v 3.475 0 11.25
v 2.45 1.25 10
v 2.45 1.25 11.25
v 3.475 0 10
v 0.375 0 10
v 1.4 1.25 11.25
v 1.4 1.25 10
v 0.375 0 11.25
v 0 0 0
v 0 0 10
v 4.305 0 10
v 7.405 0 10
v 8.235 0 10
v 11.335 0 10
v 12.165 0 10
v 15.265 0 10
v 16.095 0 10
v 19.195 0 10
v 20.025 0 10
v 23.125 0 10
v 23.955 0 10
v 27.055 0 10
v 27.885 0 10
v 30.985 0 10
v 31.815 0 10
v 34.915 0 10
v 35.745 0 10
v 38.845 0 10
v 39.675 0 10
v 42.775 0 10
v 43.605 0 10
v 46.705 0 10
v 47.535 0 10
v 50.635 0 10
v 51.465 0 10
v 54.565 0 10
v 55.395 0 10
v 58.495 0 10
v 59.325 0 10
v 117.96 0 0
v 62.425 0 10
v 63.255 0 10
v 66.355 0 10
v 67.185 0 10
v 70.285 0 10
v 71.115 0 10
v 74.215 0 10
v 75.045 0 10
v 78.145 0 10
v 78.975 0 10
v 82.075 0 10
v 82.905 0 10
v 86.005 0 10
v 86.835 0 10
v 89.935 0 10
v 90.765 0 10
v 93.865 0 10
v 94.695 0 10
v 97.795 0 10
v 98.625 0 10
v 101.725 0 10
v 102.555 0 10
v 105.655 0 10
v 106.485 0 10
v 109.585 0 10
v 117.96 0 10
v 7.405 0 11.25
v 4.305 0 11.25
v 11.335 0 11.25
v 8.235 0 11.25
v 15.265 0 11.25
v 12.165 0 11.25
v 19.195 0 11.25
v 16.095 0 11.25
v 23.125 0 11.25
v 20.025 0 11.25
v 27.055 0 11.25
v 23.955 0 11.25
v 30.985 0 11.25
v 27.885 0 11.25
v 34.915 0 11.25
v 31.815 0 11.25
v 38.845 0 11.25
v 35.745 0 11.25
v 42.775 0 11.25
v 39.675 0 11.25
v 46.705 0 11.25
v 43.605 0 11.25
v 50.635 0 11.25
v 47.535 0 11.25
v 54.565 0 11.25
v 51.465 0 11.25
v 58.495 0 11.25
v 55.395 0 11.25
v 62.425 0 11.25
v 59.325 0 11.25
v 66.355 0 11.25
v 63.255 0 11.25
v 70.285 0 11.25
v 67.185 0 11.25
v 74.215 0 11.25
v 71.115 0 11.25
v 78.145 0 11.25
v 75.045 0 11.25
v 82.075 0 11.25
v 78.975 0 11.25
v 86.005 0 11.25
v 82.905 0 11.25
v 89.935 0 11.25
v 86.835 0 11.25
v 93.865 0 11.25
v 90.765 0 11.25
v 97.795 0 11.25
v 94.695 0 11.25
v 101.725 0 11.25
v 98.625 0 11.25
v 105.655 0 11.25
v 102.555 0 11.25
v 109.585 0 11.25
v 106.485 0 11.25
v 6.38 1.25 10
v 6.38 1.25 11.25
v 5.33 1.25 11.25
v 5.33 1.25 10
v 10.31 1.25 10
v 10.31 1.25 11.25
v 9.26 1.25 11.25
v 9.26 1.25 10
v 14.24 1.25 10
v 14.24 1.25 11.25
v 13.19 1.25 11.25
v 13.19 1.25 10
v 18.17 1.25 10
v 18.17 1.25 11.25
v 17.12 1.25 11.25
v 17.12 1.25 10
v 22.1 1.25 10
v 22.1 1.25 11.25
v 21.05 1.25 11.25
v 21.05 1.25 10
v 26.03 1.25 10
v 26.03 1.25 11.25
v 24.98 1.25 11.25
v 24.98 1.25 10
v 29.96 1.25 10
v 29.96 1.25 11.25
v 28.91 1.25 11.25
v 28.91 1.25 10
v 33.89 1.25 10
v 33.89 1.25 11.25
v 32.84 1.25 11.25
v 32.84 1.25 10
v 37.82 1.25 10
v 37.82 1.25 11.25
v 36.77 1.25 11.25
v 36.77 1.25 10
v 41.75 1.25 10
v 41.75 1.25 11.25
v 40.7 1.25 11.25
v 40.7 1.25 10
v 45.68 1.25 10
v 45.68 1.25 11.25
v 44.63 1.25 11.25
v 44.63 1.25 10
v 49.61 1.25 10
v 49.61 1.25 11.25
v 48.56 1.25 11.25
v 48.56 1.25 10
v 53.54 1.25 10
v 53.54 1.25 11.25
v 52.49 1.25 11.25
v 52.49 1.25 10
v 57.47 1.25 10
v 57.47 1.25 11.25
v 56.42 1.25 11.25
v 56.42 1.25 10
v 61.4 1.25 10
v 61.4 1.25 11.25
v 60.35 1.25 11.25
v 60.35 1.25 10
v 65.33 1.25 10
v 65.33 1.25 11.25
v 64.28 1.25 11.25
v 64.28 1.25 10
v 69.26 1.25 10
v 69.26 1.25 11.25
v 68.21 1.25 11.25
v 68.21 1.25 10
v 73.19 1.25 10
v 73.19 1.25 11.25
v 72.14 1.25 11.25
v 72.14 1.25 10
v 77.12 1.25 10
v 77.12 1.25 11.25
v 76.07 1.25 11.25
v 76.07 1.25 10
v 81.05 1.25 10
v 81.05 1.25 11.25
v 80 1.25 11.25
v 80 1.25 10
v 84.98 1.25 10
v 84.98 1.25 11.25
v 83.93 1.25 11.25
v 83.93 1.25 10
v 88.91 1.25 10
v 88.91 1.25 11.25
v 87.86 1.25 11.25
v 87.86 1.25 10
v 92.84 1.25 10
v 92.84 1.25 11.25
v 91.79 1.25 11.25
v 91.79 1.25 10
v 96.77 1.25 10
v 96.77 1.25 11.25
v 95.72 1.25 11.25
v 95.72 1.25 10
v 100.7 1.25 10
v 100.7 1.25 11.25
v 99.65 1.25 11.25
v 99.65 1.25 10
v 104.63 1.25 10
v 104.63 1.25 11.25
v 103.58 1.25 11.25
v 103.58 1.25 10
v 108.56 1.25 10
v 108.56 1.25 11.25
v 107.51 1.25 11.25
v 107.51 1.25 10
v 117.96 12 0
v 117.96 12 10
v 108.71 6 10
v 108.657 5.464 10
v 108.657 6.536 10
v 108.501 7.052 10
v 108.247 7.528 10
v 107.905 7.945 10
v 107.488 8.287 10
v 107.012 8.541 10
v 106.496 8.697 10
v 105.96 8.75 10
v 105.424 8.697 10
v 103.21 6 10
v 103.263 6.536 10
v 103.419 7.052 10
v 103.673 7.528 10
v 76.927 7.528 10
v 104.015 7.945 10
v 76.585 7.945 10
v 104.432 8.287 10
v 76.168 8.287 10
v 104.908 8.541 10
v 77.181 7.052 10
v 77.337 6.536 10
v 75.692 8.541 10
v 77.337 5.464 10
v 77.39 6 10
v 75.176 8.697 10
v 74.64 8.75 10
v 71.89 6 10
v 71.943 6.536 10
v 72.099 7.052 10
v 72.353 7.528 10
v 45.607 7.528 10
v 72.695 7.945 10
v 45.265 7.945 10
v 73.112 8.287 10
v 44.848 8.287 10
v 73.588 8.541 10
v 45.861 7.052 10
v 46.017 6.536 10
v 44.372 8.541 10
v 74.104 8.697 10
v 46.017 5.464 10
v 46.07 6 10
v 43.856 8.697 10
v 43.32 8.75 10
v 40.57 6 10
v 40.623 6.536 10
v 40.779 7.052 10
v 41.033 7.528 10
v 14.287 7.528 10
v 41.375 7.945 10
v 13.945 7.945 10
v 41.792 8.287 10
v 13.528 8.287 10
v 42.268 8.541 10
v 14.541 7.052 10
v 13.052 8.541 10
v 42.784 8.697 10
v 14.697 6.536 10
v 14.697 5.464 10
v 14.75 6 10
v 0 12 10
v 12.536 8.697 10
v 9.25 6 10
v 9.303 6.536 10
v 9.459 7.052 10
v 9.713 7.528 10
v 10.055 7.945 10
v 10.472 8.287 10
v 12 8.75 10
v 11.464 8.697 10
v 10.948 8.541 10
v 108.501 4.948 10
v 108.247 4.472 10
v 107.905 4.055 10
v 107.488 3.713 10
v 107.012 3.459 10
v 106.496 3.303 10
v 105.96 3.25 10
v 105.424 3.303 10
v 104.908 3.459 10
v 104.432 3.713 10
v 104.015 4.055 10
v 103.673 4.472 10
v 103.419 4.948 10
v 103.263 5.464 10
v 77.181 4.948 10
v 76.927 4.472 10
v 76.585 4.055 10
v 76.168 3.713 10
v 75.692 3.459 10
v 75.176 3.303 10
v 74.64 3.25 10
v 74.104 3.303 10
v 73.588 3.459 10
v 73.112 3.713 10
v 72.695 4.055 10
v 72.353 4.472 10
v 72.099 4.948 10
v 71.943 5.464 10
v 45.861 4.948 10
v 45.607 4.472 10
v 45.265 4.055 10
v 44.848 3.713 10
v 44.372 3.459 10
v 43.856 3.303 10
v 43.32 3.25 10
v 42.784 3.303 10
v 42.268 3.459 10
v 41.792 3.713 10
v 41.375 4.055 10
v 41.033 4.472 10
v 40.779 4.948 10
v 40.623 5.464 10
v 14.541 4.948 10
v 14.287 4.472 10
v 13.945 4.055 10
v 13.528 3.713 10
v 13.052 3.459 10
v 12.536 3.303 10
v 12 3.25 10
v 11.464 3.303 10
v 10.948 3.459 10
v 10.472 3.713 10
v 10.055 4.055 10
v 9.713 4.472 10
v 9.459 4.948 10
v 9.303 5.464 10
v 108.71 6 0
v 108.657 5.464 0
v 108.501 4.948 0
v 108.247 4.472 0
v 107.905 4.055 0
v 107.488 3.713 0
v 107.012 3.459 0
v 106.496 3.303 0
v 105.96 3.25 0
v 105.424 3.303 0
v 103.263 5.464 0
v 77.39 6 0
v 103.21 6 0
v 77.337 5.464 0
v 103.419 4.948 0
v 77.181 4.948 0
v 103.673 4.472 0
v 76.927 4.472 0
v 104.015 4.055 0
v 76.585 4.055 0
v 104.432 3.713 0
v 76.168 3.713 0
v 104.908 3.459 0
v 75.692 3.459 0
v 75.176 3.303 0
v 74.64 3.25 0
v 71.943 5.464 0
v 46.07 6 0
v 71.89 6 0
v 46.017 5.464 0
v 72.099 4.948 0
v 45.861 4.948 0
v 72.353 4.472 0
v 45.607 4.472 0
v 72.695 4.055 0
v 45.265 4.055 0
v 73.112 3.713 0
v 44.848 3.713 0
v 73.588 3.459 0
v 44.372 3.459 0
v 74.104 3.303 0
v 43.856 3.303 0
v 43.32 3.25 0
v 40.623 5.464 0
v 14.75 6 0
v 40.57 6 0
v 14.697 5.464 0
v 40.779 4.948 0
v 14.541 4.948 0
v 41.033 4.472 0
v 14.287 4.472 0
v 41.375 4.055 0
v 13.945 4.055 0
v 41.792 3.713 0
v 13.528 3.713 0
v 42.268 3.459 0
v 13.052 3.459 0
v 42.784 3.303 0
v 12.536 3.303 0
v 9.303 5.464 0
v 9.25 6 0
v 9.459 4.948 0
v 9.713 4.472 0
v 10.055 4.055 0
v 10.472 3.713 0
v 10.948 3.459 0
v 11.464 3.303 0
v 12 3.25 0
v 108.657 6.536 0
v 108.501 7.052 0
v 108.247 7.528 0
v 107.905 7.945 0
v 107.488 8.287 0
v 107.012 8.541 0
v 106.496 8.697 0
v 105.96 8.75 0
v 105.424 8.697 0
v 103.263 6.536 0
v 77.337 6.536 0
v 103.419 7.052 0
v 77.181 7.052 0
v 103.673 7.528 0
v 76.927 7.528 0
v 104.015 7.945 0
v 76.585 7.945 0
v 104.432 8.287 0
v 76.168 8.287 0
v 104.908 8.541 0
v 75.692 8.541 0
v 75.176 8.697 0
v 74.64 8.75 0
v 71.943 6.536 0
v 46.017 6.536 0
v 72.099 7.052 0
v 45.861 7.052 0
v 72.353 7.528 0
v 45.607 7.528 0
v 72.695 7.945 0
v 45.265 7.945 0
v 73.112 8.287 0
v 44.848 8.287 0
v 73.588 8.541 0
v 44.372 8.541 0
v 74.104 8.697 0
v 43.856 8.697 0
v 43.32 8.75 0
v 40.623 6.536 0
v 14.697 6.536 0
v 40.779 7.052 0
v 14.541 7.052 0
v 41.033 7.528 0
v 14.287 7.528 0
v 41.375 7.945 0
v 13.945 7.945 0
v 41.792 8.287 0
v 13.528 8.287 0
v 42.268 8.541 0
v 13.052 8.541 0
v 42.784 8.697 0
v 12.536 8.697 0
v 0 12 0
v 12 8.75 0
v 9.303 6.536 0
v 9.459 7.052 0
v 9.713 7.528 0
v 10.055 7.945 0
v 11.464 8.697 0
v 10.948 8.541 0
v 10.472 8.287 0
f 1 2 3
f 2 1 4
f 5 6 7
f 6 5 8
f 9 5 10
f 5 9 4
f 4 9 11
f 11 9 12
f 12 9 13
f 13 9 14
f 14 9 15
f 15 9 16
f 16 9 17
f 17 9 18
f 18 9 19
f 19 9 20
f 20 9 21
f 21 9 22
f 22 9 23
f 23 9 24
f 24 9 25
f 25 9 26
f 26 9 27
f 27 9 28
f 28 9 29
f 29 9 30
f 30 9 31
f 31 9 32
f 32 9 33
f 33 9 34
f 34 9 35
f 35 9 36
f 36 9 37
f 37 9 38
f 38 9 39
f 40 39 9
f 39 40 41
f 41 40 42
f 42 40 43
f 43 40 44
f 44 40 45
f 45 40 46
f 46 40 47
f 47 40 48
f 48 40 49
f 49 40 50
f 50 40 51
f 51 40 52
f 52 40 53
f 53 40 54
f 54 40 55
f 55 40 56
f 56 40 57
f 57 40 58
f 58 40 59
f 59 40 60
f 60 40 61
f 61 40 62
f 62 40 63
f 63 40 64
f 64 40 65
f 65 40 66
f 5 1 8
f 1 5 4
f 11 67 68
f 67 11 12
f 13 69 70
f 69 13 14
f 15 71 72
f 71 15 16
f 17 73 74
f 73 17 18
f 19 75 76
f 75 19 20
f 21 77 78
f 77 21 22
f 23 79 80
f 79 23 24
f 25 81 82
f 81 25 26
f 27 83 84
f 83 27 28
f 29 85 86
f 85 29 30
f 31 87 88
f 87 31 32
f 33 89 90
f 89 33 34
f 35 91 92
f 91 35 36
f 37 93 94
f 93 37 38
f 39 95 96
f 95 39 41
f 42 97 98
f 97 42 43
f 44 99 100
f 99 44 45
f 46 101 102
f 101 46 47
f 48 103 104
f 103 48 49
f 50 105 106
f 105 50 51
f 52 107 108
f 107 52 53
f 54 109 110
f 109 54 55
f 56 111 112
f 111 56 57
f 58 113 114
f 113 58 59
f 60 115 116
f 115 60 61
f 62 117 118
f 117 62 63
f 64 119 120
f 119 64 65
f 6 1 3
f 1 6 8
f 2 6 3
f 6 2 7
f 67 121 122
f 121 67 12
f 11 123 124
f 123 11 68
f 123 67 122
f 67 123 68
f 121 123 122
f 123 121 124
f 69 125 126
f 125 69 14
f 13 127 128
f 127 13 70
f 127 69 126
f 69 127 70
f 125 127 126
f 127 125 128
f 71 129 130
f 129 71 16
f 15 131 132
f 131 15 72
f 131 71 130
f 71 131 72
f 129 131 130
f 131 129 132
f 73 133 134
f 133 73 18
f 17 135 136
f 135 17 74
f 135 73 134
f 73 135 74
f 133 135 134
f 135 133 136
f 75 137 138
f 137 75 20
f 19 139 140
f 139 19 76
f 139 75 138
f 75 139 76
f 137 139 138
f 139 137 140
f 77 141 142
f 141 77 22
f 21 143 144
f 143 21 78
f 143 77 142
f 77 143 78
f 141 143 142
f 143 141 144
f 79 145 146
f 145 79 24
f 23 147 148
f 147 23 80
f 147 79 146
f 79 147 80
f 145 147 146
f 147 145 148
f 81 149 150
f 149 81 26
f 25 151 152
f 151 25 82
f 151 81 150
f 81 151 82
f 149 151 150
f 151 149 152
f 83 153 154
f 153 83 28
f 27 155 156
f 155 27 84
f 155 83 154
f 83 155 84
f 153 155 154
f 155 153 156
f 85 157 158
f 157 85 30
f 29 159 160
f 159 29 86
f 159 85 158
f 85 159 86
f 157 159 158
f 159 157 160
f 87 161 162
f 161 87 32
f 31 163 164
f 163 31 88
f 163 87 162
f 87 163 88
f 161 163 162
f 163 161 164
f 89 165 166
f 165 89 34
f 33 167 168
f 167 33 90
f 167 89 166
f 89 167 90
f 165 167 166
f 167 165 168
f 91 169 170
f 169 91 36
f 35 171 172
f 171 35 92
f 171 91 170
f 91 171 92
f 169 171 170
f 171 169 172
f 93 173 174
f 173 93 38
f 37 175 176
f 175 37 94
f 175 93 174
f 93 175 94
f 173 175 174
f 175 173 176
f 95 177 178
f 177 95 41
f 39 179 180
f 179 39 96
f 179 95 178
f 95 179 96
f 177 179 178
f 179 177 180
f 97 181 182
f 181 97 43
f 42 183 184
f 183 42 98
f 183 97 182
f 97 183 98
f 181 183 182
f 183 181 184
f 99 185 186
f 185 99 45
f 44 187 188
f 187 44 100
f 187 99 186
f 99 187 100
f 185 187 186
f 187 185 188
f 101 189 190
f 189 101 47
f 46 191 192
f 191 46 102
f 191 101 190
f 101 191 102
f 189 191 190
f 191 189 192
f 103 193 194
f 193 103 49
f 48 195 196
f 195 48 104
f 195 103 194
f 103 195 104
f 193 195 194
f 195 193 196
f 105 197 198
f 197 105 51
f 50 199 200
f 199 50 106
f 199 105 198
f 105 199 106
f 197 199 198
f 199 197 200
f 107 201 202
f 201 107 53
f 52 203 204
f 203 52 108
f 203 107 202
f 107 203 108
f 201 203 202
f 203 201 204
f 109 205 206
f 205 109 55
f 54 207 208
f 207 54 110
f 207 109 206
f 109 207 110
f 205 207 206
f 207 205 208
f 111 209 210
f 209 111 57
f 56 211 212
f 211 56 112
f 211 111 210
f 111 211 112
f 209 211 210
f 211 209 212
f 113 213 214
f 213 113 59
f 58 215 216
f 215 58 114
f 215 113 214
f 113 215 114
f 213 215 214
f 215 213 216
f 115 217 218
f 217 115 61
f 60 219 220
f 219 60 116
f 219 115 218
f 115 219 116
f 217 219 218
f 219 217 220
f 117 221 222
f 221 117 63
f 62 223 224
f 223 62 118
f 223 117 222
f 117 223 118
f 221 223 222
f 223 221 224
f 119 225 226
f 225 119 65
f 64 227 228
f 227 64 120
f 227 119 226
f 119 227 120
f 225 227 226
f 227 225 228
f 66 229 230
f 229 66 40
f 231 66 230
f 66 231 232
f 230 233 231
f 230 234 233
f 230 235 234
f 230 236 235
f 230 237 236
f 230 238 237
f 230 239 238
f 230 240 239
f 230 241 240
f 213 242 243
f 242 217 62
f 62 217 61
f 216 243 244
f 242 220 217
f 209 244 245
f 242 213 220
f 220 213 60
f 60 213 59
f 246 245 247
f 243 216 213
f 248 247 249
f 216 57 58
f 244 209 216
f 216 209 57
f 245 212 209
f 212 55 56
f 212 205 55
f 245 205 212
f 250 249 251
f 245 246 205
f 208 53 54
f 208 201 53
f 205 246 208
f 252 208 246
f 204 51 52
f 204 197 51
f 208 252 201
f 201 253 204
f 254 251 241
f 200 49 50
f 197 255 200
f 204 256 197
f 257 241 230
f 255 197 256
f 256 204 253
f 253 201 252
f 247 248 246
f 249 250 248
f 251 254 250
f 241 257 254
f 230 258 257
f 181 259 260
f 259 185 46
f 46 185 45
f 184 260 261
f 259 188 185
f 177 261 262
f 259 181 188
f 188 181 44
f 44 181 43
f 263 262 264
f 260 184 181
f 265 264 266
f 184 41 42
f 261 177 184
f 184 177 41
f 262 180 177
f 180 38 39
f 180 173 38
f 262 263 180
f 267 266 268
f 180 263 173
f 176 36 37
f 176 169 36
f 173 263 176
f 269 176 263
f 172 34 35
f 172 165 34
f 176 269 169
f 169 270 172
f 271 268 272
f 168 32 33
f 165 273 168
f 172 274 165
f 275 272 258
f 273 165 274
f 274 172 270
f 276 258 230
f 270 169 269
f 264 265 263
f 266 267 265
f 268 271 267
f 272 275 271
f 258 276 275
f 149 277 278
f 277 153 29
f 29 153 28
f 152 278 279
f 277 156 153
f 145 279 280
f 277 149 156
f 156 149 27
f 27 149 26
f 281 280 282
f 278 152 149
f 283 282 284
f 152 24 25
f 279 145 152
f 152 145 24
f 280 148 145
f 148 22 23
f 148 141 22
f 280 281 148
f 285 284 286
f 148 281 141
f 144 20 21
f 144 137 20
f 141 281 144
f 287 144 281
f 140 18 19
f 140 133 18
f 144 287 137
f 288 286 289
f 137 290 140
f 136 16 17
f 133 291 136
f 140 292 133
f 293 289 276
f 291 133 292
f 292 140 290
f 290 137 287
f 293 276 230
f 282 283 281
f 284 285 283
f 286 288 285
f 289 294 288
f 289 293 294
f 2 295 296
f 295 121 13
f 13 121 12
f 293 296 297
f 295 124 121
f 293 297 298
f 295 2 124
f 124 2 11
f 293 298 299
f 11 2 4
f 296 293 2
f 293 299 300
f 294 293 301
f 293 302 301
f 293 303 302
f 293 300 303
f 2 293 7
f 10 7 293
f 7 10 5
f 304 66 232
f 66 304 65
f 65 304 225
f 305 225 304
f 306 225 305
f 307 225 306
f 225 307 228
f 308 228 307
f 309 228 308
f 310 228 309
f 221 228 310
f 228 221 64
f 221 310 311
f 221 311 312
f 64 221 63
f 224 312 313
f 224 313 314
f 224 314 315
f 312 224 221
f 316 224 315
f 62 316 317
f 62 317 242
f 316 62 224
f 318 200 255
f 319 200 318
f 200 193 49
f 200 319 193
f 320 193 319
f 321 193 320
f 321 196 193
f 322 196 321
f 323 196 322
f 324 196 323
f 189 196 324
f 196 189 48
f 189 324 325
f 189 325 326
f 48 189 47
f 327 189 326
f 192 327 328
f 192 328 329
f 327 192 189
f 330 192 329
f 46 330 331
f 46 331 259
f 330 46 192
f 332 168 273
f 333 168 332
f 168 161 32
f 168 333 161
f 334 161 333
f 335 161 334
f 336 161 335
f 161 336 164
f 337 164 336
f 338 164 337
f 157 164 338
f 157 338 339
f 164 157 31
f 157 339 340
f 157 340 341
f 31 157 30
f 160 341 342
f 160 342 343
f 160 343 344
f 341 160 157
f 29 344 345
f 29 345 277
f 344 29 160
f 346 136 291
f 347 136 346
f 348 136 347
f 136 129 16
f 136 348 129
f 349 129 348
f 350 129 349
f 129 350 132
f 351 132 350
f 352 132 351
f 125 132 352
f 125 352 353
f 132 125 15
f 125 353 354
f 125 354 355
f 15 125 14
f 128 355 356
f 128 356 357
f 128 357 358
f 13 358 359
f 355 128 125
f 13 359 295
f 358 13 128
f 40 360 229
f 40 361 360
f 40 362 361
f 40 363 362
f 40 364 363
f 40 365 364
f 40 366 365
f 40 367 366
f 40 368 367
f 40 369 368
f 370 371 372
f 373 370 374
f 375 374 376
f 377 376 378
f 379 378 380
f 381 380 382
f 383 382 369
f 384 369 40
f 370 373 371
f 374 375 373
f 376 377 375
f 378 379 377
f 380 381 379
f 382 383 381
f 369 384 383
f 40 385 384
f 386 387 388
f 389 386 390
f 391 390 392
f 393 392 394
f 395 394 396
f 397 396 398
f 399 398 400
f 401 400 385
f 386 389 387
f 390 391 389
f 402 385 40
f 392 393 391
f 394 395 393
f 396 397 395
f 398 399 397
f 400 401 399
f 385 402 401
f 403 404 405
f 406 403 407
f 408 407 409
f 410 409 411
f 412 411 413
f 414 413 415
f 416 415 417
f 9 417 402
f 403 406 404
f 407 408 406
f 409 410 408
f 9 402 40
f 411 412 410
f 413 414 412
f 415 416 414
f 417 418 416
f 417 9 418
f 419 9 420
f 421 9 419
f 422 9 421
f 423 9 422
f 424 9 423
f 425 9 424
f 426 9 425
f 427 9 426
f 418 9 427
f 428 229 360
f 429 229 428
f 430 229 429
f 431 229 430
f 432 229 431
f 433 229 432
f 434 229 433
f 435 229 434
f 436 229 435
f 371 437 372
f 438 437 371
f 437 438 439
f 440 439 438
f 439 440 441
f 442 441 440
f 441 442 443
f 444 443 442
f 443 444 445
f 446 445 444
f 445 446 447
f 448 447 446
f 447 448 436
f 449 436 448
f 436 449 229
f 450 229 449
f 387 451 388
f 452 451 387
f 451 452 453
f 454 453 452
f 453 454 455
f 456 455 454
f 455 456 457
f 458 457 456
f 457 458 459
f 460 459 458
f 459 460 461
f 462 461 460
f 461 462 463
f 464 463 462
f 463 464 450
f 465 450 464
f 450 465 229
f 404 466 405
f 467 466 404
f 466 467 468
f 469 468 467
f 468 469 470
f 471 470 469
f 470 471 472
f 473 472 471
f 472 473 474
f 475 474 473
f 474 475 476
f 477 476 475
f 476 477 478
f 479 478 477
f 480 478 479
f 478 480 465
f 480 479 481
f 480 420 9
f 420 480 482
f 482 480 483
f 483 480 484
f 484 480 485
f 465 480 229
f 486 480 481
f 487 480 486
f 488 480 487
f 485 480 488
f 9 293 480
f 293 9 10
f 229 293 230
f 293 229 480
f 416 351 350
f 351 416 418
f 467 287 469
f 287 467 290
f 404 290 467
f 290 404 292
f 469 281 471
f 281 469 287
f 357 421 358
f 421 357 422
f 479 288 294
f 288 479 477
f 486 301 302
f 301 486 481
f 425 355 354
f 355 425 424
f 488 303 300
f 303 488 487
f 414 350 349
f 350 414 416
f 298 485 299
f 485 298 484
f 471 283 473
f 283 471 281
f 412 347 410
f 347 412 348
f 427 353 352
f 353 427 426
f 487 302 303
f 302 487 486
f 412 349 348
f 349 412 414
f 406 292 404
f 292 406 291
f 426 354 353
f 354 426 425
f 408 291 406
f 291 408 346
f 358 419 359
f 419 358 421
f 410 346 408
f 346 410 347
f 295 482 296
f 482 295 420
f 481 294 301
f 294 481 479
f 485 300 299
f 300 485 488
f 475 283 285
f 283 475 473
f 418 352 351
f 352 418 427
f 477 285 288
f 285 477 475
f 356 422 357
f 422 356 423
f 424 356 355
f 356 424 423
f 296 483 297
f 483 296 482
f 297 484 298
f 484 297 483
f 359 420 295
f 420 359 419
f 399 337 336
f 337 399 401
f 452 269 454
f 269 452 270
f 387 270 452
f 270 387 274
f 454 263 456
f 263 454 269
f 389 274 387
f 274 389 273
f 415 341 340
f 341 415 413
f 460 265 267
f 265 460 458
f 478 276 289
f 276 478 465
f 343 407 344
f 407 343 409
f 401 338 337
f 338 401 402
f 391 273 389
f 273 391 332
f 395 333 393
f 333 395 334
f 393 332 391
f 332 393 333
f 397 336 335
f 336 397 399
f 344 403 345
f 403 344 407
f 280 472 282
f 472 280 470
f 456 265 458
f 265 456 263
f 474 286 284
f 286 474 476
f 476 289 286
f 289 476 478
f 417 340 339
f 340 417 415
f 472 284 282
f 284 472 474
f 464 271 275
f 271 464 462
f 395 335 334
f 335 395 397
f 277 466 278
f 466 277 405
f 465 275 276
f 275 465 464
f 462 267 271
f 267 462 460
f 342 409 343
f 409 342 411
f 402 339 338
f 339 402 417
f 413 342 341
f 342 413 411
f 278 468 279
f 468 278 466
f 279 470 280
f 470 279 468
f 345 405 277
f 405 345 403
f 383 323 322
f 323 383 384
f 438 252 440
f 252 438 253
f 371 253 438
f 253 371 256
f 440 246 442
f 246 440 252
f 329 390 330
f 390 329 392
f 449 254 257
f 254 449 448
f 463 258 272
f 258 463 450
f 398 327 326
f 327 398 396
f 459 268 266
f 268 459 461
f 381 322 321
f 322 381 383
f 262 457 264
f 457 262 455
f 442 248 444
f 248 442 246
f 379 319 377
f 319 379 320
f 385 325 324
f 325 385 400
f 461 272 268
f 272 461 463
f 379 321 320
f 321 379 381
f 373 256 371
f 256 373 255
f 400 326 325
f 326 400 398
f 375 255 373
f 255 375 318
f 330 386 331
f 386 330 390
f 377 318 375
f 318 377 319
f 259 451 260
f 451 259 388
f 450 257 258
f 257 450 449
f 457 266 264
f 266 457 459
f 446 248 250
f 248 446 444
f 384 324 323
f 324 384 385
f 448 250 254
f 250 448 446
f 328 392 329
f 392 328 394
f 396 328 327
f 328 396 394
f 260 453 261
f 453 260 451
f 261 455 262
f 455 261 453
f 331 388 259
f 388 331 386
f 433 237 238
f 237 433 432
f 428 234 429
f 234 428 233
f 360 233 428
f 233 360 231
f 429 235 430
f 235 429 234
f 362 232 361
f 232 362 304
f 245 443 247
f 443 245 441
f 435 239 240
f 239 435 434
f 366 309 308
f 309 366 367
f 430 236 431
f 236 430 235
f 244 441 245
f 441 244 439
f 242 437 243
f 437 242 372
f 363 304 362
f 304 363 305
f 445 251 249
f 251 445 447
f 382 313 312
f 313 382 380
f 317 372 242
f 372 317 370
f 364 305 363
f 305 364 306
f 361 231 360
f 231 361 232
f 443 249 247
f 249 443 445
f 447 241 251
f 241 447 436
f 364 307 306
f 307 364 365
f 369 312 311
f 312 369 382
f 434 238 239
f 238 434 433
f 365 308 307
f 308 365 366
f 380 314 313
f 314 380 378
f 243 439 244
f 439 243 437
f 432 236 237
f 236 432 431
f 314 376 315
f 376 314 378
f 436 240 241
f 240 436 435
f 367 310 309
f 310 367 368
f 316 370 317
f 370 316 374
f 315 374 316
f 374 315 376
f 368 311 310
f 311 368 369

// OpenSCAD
$fn = 32;

// ----------------------------------------------------------------------
// Gear rack: m=1.25 z=28, 117.96 x 12 x 11.25 mm
// ----------------------------------------------------------------------

// --- parameters (mm) ---
length = 117.96;          // rack length, X
width = 12;               // rack width, Y
height = 11.25;           // overall height, Z
module_m = 1.25;          // module
back_t = 10;              // tooth root line height
pitch = 3.93;             // circular pitch
tip_w = 1.05;             // tooth thickness at the tip
root_w = 3.1;             // tooth thickness at the root line
hole_d = 5.5;             // mounting hole
sink = 0.6;               // tooth root overlap into the body

tooth_span = 109.96;

module tooth(x0) {
  /* 20 deg flank profile, sunk into the body for a positive overlap */
  translate([x0, 0, back_t - sink])
    linear_extrude(height = height - back_t + sink)
      polygon(points = [[-root_w / 2, 0], [root_w / 2, 0],
                        [tip_w / 2, height - back_t],
                        [-tip_w / 2, height - back_t]]);
}

difference() {
  union() {
    cube([length, width, back_t]);
    for (i = [0 : 28 - 1])
      tooth((i + 0.5) * pitch + (tooth_span - 28 * pitch) / 2);
  }
  translate([12, 6, -1]) cylinder(h = back_t + 2, d = hole_d);
  translate([43.32, 6, -1]) cylinder(h = back_t + 2, d = hole_d);
  translate([74.64, 6, -1]) cylinder(h = back_t + 2, d = hole_d);
  translate([105.96, 6, -1]) cylinder(h = back_t + 2, d = hole_d);
}
